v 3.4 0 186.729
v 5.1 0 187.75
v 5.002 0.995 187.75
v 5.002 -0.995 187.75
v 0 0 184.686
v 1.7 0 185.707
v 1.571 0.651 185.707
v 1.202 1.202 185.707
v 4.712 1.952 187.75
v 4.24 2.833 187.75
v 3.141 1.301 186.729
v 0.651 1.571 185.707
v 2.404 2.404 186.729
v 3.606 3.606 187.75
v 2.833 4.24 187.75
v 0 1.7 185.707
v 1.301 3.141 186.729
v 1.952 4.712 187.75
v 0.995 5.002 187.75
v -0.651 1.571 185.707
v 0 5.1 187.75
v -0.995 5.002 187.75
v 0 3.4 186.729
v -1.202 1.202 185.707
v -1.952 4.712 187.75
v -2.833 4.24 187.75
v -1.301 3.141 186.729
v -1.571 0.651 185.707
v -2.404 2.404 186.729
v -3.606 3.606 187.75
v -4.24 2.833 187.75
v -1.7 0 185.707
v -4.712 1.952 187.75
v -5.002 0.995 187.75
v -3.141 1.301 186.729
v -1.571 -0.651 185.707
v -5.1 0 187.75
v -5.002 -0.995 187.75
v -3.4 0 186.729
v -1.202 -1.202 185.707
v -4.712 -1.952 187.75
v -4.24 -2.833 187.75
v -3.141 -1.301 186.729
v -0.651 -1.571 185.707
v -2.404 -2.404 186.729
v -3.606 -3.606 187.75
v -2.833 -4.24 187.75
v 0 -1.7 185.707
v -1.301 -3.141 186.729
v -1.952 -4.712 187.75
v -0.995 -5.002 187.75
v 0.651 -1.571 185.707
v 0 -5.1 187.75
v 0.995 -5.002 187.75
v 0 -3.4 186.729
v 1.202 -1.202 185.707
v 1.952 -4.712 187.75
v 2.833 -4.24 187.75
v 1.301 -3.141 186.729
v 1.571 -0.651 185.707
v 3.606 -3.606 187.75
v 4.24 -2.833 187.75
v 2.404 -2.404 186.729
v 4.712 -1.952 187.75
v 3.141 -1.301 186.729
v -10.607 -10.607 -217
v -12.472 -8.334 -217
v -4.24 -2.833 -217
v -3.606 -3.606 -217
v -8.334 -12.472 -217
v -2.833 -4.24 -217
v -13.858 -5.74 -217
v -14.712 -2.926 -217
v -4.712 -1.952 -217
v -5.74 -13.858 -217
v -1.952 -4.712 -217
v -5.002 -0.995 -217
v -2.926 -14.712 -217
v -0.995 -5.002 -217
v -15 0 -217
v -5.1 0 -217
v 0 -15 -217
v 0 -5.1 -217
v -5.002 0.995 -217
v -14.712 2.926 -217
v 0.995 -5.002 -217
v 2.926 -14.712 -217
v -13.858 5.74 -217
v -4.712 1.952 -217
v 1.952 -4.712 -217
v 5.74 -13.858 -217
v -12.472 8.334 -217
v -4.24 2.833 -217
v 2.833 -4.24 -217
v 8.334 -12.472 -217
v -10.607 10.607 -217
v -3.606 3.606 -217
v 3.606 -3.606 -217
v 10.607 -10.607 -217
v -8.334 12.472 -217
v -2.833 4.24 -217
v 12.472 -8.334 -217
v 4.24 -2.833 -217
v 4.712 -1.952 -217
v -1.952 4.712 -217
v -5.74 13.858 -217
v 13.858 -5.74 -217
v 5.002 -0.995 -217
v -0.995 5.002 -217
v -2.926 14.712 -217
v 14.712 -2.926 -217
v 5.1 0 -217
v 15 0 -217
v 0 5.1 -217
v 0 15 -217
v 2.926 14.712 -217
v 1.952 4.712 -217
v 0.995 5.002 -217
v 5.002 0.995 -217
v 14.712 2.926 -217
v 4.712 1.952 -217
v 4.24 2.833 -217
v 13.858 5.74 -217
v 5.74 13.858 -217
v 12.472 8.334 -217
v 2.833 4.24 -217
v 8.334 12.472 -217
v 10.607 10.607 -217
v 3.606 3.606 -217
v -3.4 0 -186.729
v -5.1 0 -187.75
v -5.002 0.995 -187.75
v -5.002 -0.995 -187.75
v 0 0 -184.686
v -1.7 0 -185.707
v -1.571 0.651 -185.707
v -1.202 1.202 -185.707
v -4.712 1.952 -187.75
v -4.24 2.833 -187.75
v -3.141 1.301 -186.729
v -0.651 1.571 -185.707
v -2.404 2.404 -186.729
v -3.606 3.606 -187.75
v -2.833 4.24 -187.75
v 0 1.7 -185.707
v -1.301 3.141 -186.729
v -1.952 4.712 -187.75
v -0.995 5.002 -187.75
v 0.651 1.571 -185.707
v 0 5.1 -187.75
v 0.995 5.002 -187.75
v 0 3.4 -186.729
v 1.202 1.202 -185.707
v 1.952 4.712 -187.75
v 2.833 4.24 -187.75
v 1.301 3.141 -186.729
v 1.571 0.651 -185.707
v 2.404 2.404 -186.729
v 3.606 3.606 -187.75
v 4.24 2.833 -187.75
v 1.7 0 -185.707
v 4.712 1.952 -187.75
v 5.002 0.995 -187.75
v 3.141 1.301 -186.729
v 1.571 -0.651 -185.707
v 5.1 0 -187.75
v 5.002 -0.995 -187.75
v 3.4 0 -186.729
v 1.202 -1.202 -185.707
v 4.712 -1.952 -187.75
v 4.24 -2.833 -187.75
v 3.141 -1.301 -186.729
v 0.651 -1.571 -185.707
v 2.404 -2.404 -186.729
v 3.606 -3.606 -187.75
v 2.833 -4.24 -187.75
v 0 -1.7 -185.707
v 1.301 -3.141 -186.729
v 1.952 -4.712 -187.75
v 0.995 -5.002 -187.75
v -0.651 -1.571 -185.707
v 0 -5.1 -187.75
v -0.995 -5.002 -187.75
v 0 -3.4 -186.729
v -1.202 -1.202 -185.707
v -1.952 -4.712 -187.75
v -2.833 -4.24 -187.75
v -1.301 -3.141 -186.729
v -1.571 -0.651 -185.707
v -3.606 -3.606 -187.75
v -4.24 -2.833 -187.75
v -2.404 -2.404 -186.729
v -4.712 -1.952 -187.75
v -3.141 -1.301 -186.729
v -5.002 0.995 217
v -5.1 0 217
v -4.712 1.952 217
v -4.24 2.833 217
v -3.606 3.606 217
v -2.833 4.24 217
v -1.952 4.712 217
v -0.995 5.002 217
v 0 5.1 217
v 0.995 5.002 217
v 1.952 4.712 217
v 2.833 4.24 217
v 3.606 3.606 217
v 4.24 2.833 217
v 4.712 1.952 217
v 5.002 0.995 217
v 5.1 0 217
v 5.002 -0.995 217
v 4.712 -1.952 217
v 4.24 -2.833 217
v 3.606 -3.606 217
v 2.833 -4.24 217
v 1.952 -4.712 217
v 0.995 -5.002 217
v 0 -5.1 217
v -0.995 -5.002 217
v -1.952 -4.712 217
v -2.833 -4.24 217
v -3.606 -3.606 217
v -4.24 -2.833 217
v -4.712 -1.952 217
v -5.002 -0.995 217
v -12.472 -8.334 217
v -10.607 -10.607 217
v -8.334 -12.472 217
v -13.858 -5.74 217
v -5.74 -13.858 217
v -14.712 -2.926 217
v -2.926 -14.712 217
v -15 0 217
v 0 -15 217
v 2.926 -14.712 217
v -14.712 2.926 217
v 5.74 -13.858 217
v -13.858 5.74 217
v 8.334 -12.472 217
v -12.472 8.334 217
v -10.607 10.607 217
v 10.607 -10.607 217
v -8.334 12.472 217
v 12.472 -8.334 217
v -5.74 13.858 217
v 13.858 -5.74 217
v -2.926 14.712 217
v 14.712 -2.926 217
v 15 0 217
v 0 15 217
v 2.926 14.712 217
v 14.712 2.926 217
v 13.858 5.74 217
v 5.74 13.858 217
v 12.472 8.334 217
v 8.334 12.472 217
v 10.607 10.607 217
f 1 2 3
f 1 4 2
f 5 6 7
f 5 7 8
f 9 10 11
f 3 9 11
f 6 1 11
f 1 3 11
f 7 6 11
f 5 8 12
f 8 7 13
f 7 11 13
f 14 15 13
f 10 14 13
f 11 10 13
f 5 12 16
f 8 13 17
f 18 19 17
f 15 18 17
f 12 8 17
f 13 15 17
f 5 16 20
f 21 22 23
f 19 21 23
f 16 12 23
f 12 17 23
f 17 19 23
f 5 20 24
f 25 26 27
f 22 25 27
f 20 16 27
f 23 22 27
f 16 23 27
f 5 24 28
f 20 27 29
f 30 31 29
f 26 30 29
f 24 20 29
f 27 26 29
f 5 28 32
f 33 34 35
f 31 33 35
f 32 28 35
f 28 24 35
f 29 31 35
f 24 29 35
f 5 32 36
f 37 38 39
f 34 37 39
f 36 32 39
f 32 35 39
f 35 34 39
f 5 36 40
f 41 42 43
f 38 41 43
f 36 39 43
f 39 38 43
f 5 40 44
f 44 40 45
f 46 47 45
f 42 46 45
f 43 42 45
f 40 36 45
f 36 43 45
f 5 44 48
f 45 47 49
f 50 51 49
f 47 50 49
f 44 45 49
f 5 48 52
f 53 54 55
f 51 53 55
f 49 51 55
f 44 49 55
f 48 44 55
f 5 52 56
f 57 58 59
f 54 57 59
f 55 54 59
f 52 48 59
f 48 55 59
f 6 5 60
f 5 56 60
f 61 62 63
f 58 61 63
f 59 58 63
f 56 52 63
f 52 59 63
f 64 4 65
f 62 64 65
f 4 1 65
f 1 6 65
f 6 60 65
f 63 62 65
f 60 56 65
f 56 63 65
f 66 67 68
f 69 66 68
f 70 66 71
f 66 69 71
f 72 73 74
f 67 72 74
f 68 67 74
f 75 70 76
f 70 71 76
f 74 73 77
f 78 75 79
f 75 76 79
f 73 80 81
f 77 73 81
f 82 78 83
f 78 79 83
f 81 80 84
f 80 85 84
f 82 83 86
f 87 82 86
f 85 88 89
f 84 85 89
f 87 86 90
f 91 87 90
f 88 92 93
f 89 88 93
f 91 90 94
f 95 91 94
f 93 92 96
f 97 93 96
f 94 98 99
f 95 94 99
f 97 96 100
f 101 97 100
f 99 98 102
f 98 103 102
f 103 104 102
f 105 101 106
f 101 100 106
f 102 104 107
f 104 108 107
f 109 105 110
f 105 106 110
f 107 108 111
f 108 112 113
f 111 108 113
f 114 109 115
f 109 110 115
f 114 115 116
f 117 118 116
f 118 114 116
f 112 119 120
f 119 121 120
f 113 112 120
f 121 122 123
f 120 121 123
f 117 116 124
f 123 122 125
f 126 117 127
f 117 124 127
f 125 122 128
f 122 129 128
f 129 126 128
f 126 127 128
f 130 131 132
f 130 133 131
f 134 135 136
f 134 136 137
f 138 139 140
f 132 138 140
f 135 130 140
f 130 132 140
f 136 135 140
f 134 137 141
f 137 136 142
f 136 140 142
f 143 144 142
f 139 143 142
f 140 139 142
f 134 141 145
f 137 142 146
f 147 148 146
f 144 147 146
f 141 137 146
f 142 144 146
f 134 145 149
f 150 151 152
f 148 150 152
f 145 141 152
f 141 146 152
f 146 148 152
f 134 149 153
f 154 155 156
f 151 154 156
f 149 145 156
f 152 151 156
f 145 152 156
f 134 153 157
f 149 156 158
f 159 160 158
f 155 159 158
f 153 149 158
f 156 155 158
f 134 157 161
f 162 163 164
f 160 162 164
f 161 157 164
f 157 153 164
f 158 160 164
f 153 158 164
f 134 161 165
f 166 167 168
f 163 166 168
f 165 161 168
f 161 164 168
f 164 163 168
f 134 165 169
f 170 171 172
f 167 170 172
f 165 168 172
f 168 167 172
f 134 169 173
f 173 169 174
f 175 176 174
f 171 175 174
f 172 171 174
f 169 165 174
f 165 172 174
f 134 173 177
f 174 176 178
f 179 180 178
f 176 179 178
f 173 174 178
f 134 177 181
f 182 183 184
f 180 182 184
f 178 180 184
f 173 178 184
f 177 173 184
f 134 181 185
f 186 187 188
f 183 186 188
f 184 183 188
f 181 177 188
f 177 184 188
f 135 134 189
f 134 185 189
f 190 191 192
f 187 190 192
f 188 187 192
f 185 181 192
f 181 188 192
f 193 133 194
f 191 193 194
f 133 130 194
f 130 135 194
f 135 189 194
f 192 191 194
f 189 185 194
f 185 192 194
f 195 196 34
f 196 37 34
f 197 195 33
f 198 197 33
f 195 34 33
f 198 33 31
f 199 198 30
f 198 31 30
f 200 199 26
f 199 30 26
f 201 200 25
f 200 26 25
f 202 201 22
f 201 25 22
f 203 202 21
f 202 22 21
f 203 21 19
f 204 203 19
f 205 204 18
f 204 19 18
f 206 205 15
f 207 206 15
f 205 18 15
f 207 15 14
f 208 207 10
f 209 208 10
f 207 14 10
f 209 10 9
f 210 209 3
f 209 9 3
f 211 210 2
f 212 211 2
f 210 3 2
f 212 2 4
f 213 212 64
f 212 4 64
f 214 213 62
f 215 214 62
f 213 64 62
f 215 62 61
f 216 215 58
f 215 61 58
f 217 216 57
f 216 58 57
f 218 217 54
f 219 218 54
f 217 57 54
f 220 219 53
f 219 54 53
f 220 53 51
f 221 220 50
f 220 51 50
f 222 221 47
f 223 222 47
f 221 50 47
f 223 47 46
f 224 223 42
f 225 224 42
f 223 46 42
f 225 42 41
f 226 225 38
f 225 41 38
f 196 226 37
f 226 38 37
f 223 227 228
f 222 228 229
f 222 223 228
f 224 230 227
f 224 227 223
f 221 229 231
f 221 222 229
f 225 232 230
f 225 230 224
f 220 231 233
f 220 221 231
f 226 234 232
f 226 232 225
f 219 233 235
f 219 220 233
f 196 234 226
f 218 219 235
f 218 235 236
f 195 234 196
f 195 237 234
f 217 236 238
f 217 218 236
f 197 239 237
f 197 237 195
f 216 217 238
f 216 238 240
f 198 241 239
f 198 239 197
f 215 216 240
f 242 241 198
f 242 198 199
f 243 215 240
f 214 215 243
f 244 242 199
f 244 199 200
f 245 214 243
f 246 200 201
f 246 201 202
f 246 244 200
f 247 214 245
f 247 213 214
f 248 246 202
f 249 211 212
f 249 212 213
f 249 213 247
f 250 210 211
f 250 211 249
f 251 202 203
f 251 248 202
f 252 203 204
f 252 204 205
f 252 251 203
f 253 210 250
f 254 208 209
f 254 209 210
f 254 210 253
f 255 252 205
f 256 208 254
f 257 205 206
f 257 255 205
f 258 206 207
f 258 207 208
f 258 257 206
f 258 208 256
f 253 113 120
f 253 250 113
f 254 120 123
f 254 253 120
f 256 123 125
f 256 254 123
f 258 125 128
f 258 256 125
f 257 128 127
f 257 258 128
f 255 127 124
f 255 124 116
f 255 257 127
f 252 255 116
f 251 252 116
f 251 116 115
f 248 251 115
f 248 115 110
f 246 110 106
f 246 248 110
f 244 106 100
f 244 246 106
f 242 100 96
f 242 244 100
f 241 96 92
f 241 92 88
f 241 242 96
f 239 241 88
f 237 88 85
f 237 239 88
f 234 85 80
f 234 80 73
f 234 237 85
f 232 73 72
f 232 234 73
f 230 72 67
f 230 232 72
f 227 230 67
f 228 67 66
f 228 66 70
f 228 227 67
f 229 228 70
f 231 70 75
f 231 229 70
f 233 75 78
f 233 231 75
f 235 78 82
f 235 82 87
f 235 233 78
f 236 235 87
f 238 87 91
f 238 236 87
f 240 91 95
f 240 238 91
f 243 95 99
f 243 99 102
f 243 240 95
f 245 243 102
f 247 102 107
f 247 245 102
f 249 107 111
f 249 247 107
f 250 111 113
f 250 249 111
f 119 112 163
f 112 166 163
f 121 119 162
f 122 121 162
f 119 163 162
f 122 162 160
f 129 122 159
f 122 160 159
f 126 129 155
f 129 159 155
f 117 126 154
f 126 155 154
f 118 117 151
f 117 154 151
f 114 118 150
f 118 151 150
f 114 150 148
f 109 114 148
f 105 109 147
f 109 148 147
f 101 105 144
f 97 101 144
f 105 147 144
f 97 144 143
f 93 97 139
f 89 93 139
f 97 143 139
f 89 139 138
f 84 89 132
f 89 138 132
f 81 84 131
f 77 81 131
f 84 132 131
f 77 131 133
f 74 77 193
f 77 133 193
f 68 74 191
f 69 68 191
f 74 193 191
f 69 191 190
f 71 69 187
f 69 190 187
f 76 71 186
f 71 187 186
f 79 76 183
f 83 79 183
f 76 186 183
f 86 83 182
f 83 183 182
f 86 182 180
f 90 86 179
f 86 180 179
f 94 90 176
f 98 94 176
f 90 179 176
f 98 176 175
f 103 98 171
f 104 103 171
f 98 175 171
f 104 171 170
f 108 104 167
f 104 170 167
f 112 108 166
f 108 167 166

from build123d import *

# Parameters (mm, degrees)
SKETCH_1_R                        = 15
EXTRUDE_1_DEPTH                   = 217
HOLE_WIZARD_M12_1_D               = 10.2
HOLE_WIZARD_M12_1_DEPTH           = 29.25
HOLE_WIZARD_M12_1_TIP             = 3.064389157
HOLE_WIZARD_M12_1_ON_FACE_2_D     = 10.2
HOLE_WIZARD_M12_1_ON_FACE_2_DEPTH = 29.25
HOLE_WIZARD_M12_1_ON_FACE_2_TIP   = 3.064389157


with BuildPart() as part:
    # 草图1 → 凸台-拉伸1 (new body, symmetric)
    with BuildSketch(Plane.XY):
        Circle(SKETCH_1_R)
    extrude(amount=EXTRUDE_1_DEPTH, both=True)

    # M12 螺纹孔1
    with Locations(Plane.XY.offset(217)):
        with Locations((0, 0)):
            Hole(HOLE_WIZARD_M12_1_D / 2, depth=HOLE_WIZARD_M12_1_DEPTH)
            with Locations((0, 0, -(HOLE_WIZARD_M12_1_DEPTH + HOLE_WIZARD_M12_1_TIP / 2))):  # 118° drill point
                Cone(0, HOLE_WIZARD_M12_1_D / 2, HOLE_WIZARD_M12_1_TIP, mode=Mode.SUBTRACT)

    # M12 螺纹孔1 on face 2
    with Locations(Plane(origin=(0, 0, -217), x_dir=(-1, 0, 0), z_dir=(0, 0, -1))):
        with Locations((0, 0)):
            Hole(HOLE_WIZARD_M12_1_ON_FACE_2_D / 2, depth=HOLE_WIZARD_M12_1_ON_FACE_2_DEPTH)
            with Locations((0, 0, -(HOLE_WIZARD_M12_1_ON_FACE_2_DEPTH + HOLE_WIZARD_M12_1_ON_FACE_2_TIP / 2))):  # 118° drill point
                Cone(0, HOLE_WIZARD_M12_1_ON_FACE_2_D / 2, HOLE_WIZARD_M12_1_ON_FACE_2_TIP, mode=Mode.SUBTRACT)


solid = part.part
